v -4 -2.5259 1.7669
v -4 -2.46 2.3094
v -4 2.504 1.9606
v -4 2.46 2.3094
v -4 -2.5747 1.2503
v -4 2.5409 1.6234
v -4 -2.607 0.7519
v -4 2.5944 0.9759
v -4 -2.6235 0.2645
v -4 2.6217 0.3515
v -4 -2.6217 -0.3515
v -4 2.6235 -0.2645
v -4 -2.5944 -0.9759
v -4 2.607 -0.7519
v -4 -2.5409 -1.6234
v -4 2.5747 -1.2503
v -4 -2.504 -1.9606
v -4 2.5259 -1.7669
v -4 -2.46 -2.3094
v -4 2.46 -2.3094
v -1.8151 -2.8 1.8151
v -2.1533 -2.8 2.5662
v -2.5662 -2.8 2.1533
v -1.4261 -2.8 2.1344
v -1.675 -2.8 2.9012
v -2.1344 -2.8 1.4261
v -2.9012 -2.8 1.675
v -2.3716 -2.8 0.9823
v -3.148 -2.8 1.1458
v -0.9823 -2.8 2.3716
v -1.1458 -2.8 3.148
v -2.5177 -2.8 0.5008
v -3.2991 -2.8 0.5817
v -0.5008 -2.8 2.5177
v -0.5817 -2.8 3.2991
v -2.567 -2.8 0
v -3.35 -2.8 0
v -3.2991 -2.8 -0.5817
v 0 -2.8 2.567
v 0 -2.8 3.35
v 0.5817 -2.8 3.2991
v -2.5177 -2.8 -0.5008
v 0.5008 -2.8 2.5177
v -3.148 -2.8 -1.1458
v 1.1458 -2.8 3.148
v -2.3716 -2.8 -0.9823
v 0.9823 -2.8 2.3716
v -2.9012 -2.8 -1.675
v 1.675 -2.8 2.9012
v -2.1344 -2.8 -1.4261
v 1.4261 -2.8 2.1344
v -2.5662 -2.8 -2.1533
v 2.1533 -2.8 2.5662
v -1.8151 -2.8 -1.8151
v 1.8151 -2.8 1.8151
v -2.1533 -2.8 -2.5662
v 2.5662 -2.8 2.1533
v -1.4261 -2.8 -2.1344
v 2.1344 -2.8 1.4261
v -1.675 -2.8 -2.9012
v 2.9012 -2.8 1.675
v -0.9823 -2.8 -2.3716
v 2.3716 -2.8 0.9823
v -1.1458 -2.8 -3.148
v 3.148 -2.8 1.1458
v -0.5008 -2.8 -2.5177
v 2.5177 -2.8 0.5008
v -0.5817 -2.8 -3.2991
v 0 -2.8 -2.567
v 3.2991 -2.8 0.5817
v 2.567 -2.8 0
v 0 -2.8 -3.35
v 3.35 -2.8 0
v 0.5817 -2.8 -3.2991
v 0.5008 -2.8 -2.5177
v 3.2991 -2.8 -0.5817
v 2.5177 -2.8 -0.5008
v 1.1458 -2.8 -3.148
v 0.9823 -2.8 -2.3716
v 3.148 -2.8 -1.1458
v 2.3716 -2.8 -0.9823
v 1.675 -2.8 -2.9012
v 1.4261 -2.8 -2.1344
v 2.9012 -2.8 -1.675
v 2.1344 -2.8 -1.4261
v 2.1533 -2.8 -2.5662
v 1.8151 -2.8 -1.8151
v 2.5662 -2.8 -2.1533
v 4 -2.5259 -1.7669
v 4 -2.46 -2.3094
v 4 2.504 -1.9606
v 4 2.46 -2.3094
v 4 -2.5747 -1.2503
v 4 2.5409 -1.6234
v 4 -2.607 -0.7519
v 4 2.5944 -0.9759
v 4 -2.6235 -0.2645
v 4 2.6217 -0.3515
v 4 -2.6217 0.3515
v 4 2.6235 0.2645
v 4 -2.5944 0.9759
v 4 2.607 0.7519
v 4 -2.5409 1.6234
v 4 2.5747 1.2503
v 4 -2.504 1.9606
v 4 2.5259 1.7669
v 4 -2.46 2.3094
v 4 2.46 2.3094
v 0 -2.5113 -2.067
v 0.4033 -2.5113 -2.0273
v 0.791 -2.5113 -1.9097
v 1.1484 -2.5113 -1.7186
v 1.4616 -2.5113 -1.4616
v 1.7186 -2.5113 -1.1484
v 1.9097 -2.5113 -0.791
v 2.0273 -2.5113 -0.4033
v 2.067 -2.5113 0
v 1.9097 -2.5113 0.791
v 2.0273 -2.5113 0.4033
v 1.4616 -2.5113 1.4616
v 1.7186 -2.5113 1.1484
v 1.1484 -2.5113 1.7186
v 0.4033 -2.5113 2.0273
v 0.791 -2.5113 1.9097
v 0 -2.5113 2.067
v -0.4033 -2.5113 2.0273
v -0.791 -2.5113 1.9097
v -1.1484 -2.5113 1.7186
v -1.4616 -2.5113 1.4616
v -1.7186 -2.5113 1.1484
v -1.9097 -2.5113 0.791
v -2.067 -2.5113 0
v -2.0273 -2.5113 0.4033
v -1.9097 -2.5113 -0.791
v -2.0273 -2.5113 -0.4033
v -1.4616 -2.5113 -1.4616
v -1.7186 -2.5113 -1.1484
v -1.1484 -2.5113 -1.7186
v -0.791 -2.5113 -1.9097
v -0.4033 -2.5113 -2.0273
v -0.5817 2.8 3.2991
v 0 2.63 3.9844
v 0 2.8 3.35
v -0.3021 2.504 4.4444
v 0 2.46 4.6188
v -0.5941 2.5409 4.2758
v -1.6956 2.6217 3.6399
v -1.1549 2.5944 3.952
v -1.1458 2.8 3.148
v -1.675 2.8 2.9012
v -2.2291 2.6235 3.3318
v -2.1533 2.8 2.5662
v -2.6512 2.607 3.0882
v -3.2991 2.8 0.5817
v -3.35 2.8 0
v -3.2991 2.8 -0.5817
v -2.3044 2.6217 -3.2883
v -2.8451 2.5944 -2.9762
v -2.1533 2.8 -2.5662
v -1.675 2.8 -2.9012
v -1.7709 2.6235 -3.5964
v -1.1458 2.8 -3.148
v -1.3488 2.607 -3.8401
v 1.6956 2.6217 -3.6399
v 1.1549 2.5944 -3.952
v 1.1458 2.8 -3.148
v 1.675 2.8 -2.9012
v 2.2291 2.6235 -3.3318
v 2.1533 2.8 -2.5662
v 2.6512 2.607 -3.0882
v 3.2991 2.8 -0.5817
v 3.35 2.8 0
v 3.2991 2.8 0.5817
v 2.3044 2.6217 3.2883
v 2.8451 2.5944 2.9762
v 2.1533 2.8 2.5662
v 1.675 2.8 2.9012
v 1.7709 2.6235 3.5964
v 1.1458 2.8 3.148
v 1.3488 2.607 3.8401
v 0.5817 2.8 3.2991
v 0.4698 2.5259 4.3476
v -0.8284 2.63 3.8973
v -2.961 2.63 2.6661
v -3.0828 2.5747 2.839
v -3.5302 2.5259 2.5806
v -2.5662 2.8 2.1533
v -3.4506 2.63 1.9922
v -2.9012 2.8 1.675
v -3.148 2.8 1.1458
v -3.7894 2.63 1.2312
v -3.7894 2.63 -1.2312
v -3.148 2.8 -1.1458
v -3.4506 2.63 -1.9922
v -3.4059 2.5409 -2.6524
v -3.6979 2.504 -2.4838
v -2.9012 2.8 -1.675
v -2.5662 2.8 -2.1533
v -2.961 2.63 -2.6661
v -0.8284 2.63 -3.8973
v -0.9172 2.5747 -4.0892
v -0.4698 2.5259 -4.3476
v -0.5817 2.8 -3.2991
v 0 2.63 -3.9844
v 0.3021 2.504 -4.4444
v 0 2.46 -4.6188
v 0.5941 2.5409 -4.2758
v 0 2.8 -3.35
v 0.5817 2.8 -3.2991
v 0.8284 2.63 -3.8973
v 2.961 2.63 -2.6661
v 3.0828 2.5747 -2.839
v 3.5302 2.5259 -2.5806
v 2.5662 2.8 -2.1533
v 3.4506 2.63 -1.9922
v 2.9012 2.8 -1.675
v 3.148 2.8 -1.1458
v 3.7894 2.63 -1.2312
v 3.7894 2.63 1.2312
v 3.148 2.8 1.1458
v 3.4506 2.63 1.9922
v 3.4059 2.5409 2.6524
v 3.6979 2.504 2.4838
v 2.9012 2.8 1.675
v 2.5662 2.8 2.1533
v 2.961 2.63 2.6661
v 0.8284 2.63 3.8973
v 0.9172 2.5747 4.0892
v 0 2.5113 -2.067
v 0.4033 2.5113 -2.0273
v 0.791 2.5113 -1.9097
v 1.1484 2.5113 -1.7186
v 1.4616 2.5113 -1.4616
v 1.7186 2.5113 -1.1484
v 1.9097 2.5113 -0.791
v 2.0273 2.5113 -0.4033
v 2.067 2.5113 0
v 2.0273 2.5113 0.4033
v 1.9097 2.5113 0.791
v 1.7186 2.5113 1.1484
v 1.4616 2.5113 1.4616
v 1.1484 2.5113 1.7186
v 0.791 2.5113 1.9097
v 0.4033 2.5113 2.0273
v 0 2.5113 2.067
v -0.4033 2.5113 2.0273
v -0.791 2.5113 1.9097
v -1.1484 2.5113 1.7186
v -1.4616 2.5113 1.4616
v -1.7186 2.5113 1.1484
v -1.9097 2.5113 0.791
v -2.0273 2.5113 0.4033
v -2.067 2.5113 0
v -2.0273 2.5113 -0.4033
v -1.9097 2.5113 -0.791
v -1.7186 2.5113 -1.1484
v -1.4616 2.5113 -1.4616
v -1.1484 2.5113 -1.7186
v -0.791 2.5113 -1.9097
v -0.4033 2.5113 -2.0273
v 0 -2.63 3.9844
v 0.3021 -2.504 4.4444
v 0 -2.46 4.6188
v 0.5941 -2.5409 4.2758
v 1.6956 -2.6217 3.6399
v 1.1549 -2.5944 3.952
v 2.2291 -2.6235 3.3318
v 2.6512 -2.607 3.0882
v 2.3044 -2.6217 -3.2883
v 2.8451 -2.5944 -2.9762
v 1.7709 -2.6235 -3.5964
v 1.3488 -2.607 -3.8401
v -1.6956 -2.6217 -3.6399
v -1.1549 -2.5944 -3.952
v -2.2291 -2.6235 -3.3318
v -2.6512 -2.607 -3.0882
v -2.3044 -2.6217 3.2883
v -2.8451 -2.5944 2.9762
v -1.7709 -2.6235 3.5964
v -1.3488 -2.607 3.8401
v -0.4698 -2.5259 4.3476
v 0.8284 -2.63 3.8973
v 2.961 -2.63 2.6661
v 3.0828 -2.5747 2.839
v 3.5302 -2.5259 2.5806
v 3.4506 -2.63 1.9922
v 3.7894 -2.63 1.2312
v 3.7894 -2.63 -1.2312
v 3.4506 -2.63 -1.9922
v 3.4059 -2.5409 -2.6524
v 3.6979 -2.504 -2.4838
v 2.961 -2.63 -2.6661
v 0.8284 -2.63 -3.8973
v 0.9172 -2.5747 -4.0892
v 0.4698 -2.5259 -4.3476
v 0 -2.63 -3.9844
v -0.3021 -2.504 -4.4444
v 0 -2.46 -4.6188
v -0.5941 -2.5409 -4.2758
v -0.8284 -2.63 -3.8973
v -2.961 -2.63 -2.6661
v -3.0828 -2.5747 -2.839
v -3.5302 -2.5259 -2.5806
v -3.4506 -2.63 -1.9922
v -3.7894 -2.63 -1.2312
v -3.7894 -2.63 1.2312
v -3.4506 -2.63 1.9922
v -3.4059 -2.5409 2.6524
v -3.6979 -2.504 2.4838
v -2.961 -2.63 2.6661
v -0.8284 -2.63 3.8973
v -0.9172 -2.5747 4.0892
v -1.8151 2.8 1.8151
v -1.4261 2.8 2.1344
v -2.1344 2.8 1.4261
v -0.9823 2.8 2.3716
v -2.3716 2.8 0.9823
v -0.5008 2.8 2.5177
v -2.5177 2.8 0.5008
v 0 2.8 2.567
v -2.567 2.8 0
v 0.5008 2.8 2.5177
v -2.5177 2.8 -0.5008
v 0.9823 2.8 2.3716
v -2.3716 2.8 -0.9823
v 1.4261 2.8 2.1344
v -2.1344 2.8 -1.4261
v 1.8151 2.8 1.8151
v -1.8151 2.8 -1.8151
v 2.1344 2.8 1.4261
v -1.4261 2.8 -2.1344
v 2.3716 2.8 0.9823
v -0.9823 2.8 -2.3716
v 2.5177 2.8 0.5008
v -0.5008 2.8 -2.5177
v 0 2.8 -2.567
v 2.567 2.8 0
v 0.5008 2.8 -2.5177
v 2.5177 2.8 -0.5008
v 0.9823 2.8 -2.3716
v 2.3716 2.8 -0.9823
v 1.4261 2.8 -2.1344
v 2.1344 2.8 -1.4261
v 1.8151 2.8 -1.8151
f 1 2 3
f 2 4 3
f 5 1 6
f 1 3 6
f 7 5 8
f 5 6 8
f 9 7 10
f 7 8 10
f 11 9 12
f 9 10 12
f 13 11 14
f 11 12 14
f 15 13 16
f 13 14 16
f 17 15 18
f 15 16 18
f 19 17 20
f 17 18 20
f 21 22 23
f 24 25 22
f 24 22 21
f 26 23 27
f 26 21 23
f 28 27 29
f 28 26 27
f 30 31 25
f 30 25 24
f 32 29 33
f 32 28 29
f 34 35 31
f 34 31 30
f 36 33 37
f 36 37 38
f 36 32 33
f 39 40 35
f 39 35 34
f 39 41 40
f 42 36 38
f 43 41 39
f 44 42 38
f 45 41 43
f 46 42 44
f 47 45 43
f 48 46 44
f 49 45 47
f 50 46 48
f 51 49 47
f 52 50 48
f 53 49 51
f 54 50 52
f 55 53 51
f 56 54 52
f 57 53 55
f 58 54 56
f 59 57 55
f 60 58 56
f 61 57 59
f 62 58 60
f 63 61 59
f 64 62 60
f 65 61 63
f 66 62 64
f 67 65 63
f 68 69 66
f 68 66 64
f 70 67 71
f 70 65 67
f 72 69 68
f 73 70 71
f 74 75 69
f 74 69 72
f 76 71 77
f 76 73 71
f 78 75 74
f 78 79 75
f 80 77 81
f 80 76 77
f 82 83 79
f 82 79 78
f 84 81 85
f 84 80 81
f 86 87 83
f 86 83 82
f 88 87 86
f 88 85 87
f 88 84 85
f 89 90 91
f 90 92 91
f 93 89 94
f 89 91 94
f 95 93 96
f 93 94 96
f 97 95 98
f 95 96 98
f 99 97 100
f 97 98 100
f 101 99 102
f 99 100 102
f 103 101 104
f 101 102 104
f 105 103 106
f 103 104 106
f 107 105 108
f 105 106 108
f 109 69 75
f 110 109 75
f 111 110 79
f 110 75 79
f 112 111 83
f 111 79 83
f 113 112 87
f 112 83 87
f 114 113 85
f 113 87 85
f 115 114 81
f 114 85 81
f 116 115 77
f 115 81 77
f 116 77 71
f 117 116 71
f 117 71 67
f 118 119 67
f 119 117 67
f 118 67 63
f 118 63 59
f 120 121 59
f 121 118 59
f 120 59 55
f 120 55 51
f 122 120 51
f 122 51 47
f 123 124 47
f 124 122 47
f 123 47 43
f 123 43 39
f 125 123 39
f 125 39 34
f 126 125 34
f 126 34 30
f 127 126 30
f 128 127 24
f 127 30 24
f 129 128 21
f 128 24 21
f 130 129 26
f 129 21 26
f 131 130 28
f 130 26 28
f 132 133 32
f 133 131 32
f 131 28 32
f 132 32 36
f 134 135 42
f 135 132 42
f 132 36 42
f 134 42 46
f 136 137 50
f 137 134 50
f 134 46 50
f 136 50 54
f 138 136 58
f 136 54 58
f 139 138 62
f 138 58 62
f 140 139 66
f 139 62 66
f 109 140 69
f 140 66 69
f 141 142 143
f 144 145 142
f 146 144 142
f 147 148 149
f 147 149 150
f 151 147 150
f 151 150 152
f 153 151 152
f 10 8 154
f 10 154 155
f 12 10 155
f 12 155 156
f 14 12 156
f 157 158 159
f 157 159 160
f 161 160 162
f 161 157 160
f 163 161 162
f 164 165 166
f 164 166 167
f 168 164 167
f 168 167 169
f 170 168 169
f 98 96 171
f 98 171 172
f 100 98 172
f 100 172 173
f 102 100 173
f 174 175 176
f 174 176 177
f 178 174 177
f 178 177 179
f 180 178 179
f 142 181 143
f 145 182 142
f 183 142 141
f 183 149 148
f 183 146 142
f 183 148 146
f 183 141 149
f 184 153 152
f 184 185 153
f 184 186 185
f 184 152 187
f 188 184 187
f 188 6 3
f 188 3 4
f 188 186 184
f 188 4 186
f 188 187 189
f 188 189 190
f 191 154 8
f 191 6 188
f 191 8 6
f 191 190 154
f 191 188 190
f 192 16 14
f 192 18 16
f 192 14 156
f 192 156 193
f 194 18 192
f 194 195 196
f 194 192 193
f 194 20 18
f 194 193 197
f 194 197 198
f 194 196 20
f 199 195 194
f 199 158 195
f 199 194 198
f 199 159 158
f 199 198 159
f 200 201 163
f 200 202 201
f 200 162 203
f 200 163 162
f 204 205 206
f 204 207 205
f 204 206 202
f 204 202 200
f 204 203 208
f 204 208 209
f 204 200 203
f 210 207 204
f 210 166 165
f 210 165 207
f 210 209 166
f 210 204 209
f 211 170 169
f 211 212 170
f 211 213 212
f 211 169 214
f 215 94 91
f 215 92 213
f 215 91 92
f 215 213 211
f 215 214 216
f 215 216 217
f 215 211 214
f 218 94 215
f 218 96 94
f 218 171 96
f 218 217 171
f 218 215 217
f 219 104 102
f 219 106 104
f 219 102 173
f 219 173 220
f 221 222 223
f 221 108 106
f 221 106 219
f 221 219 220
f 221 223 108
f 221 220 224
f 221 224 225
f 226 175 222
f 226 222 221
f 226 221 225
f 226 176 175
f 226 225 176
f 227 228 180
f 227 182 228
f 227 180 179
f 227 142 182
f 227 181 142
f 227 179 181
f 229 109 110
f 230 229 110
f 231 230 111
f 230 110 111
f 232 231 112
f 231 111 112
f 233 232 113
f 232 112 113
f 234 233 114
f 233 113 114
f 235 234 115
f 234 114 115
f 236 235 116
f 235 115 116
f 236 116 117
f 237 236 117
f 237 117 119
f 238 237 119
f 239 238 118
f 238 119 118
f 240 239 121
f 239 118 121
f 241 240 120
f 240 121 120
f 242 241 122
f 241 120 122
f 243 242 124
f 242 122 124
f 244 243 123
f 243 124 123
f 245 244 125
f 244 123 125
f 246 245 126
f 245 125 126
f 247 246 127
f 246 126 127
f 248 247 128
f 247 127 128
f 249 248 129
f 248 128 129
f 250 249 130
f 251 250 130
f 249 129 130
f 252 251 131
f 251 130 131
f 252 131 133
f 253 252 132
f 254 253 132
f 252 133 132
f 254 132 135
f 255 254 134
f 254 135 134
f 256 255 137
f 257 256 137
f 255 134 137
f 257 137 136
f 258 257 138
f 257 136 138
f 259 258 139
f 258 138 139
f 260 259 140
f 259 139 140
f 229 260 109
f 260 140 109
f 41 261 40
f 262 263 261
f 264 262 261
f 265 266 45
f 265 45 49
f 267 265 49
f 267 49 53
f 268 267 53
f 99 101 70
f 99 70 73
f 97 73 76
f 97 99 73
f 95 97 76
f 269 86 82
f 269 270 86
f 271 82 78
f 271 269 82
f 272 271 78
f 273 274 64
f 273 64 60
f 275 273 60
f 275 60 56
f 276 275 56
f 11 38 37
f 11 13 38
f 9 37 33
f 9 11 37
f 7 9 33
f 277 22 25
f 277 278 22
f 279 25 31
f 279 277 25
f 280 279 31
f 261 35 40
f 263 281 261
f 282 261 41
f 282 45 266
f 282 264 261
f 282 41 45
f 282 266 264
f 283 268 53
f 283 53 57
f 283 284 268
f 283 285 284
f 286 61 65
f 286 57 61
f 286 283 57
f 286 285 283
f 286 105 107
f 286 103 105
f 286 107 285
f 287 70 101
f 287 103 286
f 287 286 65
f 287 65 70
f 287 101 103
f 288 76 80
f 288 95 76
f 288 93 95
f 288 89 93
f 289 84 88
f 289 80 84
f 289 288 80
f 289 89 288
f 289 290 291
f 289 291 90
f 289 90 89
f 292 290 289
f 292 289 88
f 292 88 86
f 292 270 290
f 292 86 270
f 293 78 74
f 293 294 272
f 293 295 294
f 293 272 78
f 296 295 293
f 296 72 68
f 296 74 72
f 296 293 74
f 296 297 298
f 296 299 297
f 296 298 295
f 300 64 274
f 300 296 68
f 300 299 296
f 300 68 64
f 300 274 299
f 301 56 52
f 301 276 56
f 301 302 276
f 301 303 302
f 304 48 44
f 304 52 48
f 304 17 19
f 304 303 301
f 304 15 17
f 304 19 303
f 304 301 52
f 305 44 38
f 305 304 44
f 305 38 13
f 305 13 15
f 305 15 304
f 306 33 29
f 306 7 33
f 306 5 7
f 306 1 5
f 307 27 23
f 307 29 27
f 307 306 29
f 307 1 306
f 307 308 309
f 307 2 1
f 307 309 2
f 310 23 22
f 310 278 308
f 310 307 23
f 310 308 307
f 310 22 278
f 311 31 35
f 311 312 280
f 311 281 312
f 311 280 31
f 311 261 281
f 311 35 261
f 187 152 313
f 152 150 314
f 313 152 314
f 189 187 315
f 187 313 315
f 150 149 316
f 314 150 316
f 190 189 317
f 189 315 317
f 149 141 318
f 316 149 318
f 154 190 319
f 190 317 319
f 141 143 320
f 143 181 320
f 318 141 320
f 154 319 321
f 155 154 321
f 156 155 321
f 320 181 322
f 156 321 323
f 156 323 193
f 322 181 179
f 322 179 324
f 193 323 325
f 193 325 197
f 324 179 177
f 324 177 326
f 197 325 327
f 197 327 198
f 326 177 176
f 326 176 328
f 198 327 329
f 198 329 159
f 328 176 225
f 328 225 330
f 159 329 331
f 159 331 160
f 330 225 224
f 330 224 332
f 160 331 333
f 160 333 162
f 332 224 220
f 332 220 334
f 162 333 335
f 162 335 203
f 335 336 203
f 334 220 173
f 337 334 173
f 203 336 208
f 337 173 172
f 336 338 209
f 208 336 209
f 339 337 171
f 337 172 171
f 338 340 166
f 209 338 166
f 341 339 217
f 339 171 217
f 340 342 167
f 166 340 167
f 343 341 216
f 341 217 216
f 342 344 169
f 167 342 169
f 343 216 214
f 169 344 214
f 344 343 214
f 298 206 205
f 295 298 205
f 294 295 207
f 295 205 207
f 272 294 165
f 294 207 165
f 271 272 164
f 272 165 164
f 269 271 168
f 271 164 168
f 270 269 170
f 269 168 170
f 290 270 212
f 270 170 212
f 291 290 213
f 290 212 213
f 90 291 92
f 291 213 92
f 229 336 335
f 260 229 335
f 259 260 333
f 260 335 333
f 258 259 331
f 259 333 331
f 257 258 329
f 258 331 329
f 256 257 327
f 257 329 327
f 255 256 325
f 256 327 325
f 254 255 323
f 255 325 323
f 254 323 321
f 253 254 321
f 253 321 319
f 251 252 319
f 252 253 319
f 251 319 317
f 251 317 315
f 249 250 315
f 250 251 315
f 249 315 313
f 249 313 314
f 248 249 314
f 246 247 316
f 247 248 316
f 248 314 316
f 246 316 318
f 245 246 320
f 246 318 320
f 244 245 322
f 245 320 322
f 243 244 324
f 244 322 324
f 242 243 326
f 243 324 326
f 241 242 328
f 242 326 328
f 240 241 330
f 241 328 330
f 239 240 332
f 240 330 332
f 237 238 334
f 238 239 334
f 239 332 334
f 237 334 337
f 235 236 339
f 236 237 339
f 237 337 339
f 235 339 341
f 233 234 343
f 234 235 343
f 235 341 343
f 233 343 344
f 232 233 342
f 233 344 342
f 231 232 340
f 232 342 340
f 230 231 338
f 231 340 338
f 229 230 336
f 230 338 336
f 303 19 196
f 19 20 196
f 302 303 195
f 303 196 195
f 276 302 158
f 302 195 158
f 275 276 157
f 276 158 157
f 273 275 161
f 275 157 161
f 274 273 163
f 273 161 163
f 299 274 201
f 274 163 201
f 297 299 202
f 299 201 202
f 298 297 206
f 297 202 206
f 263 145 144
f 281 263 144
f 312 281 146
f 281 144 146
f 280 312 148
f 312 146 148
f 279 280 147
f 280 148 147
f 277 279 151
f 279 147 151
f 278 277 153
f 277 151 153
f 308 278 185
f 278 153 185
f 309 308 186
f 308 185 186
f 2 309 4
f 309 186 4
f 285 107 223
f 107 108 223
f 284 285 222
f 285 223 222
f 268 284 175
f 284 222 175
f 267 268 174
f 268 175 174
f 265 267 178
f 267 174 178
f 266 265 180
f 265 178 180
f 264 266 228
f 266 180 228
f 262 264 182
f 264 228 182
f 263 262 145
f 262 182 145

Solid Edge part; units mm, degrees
sketch "Sketch1" plane through (0, 0, 0) normal (0, -1, 0) x (1, 0, 0)
  line L0 (4, 2.3094) -> (0, 4.6188)
  line L1 (0, 4.6188) -> (-4, 2.3094)
  line L2 (-4, 2.3094) -> (-4, -2.3094)
  line L3 (-4, -2.3094) -> (0, -4.6188)
  line L4 (0, -4.6188) -> (4, -2.3094)
  line L5 (4, -2.3094) -> (4, 2.3094)
extrude "Protrusion1" add sketch "Sketch1" along normal mid plane 5.6
sketch "Sketch2" plane through (0, 0, 0) normal (1, 0, 0) x (0, 1, 0)
  line L0 (-2.8, 3.35) -> (-2.46, 4.6188)
revolve "RevolvedCutout1" cut sketch "Sketch2" angle 360 about axis through (0, 0, 0) along (0, -1, 0) material side at (0, -2.6783, 3.9973)
mirror "Mirror1" about plane through (0, 0, 0) normal (0, -1, 0) of "RevolvedCutout1"
hole "孔_7" at (0, -2.8, 0) direction (0, 1, 0) diameter 4.134 end up to next start chamfer 0.5 start chamfer angle 60 end chamfer 0.5 end chamfer angle 60
properties part number "N2611-1312" material "钢"
